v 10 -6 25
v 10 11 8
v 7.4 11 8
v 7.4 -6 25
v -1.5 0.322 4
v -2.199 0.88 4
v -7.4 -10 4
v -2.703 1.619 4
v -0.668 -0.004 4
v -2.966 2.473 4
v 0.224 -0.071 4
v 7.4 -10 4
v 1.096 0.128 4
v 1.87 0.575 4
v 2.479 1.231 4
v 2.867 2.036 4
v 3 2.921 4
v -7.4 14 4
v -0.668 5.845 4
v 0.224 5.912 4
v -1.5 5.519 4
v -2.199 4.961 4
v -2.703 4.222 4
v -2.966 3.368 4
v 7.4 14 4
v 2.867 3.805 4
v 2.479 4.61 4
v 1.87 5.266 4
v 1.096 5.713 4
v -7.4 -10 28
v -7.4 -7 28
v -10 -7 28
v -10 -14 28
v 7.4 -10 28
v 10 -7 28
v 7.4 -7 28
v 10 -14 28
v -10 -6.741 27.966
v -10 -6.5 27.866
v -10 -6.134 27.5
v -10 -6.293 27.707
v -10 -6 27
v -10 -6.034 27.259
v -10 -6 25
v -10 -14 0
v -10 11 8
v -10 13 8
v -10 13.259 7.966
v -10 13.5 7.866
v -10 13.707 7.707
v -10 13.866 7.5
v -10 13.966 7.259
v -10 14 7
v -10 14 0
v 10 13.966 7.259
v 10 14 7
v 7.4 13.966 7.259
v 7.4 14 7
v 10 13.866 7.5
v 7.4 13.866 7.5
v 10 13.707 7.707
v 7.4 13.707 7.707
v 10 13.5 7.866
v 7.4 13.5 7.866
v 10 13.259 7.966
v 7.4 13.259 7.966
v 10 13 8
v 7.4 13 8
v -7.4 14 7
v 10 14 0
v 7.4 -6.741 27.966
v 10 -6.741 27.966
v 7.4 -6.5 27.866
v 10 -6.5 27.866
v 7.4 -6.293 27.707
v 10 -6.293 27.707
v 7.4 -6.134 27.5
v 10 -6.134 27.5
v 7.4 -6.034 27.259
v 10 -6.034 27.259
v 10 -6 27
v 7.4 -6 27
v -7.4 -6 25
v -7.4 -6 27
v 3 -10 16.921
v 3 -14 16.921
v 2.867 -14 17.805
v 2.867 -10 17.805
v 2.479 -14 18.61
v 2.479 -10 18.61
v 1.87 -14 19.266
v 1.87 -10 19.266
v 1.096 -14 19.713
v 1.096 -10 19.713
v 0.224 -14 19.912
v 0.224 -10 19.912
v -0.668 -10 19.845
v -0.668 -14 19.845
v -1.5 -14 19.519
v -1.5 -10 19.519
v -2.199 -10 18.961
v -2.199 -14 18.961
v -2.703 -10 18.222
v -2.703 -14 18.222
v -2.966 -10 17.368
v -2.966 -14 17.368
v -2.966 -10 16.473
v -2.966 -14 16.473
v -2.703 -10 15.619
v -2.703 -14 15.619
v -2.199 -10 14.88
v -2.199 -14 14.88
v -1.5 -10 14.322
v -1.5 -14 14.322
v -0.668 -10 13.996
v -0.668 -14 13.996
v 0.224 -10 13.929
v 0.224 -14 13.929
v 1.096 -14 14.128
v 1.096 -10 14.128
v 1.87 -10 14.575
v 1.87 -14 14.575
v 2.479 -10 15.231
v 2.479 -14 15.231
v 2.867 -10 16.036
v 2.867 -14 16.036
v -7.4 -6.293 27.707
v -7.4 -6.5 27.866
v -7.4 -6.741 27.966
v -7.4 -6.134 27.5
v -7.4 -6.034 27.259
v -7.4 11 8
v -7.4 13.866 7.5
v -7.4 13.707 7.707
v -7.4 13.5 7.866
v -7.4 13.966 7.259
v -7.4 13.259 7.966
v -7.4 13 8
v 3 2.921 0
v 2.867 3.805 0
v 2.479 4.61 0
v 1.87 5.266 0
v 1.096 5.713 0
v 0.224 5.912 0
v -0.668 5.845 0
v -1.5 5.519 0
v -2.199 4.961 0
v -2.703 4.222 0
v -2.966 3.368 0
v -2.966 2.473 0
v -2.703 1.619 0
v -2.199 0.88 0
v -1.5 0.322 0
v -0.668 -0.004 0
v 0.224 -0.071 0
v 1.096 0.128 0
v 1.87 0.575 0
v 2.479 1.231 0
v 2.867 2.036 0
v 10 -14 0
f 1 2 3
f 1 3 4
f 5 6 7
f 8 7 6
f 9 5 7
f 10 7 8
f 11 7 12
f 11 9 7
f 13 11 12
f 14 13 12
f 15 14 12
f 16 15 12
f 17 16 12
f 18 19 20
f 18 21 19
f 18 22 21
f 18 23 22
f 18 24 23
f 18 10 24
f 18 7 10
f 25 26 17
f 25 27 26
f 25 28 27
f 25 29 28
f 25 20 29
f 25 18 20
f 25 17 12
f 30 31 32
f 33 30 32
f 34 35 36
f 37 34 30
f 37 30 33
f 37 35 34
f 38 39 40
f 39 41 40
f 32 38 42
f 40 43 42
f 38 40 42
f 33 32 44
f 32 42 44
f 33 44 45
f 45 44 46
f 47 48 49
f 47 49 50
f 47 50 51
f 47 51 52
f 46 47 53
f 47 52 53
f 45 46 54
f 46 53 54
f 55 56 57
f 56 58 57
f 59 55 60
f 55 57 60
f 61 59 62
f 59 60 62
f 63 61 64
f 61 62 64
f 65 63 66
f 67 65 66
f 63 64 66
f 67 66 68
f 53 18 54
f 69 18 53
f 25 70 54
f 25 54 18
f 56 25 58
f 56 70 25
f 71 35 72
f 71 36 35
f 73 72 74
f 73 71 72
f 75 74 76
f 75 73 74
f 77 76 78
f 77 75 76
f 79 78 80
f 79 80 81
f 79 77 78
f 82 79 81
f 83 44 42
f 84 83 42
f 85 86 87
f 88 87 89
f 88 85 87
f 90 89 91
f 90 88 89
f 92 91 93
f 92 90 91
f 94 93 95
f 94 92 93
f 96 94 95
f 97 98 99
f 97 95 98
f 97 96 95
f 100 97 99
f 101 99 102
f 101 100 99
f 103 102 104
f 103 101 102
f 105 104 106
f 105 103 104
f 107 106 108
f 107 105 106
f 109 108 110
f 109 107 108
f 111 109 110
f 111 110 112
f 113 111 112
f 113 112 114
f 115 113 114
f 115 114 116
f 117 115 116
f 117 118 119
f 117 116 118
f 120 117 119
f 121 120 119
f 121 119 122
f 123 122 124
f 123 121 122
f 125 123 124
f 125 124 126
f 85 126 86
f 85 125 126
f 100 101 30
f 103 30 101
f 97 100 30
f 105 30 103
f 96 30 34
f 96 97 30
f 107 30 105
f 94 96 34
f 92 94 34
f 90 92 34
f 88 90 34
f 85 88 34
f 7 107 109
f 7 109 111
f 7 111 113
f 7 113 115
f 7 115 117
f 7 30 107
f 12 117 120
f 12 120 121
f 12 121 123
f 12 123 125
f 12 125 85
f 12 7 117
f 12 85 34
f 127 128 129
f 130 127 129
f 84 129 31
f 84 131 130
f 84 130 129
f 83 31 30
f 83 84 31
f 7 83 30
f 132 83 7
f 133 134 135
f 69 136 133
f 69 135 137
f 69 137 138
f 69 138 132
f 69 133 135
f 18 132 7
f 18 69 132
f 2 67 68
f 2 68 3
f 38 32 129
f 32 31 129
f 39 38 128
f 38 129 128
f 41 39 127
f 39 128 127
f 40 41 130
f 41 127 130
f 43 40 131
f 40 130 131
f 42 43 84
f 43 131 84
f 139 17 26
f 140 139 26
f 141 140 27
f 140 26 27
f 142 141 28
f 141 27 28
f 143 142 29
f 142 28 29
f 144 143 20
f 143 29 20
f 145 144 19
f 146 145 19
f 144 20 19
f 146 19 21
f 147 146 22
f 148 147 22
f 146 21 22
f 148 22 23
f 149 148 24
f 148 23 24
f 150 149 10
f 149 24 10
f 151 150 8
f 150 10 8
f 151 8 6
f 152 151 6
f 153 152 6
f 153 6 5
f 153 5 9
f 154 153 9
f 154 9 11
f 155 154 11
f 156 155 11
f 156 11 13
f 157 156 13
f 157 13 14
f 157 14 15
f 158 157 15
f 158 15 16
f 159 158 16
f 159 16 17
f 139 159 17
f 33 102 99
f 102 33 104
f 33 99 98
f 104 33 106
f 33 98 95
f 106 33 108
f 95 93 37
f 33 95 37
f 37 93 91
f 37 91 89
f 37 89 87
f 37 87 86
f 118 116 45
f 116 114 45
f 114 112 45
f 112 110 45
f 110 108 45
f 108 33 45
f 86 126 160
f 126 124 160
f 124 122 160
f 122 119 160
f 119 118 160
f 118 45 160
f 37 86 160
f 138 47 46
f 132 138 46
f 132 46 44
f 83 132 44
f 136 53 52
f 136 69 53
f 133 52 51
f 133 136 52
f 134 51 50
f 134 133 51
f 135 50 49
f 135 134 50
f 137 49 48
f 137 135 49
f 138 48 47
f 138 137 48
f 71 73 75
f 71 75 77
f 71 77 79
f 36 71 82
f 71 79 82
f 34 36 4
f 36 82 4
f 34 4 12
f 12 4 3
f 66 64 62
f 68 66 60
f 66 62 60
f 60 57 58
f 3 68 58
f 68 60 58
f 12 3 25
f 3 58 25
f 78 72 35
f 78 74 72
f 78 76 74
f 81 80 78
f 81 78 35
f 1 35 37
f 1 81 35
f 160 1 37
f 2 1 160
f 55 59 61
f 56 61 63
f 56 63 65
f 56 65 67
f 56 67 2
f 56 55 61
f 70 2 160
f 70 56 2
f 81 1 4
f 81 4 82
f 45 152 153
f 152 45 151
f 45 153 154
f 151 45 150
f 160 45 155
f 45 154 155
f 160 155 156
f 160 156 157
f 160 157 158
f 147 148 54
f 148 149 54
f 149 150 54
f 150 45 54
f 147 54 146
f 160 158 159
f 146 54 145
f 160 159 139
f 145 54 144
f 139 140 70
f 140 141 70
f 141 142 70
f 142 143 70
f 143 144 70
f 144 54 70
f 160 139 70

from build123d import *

# Parameters (mm, degrees)
SKETCH_1_W          = 20
SKETCH_1_H          = 28
EXTRUDE_1_DEPTH     = 4
SKETCH_2_W          = 20
SKETCH_2_H          = 4
EXTRUDE_2_DEPTH     = 24
EXTRUDE_3_DEPTH     = 2.6
FILLET_1_R          = 1
SKETCH_4_R          = 3
CUT_EXTRUDE_1_DEPTH = 30.52964612


with BuildPart() as part:
    # 草图1 → 凸台-拉伸1 (new body)
    with BuildSketch(Plane.XY):
        Rectangle(SKETCH_1_W, SKETCH_1_H)
    extrude(amount=EXTRUDE_1_DEPTH)

    # 草图2 → 凸台-拉伸2 (add)
    with BuildSketch(Plane.XY.offset(4)):
        with Locations((0, -12)):
            Rectangle(SKETCH_2_W, SKETCH_2_H)
    extrude(amount=EXTRUDE_2_DEPTH)

    # 草图3 → 凸台-拉伸3 (add)
    with BuildSketch(Plane.ZY.offset(10)):
        Polygon((4, 14), (8, 14), (8, 11), (25, -6), (28, -6), (28, -10), (4, -10), align=None)
    extrude_3 = extrude(amount=-EXTRUDE_3_DEPTH)

    # 镜向1: 凸台-拉伸3 across plane
    add(extrude_3.mirror(Plane(origin=(0, 0, 0), x_dir=(0, 0, 1), z_dir=(1, 0, 0))))

    # 圆角1
    fillet_1_edges = [part.edges().sort_by_distance(p)[0] for p in [
        (-8.7, 14, 8),
        (-8.7, -6, 28),
        (8.7, -6, 28),
        (8.7, 14, 8),
    ]]
    fillet(fillet_1_edges, radius=FILLET_1_R)

    # 草图4 → 切除-拉伸1 (cut, through all)
    with BuildSketch(Plane.XY.offset(4)):
        with Locations((0, 2.920534958)):
            Circle(SKETCH_4_R)
    cut_extrude_1 = extrude(amount=-CUT_EXTRUDE_1_DEPTH, mode=Mode.SUBTRACT)

    # 镜向2: 切除-拉伸1 across plane
    add(cut_extrude_1.mirror(Plane(origin=(0, -7, 7), x_dir=(0, 0.7071067811865476, 0.7071067811865476), z_dir=(0, -0.7071067811865477, 0.7071067811865475))), mode=Mode.SUBTRACT)


solid = part.part
